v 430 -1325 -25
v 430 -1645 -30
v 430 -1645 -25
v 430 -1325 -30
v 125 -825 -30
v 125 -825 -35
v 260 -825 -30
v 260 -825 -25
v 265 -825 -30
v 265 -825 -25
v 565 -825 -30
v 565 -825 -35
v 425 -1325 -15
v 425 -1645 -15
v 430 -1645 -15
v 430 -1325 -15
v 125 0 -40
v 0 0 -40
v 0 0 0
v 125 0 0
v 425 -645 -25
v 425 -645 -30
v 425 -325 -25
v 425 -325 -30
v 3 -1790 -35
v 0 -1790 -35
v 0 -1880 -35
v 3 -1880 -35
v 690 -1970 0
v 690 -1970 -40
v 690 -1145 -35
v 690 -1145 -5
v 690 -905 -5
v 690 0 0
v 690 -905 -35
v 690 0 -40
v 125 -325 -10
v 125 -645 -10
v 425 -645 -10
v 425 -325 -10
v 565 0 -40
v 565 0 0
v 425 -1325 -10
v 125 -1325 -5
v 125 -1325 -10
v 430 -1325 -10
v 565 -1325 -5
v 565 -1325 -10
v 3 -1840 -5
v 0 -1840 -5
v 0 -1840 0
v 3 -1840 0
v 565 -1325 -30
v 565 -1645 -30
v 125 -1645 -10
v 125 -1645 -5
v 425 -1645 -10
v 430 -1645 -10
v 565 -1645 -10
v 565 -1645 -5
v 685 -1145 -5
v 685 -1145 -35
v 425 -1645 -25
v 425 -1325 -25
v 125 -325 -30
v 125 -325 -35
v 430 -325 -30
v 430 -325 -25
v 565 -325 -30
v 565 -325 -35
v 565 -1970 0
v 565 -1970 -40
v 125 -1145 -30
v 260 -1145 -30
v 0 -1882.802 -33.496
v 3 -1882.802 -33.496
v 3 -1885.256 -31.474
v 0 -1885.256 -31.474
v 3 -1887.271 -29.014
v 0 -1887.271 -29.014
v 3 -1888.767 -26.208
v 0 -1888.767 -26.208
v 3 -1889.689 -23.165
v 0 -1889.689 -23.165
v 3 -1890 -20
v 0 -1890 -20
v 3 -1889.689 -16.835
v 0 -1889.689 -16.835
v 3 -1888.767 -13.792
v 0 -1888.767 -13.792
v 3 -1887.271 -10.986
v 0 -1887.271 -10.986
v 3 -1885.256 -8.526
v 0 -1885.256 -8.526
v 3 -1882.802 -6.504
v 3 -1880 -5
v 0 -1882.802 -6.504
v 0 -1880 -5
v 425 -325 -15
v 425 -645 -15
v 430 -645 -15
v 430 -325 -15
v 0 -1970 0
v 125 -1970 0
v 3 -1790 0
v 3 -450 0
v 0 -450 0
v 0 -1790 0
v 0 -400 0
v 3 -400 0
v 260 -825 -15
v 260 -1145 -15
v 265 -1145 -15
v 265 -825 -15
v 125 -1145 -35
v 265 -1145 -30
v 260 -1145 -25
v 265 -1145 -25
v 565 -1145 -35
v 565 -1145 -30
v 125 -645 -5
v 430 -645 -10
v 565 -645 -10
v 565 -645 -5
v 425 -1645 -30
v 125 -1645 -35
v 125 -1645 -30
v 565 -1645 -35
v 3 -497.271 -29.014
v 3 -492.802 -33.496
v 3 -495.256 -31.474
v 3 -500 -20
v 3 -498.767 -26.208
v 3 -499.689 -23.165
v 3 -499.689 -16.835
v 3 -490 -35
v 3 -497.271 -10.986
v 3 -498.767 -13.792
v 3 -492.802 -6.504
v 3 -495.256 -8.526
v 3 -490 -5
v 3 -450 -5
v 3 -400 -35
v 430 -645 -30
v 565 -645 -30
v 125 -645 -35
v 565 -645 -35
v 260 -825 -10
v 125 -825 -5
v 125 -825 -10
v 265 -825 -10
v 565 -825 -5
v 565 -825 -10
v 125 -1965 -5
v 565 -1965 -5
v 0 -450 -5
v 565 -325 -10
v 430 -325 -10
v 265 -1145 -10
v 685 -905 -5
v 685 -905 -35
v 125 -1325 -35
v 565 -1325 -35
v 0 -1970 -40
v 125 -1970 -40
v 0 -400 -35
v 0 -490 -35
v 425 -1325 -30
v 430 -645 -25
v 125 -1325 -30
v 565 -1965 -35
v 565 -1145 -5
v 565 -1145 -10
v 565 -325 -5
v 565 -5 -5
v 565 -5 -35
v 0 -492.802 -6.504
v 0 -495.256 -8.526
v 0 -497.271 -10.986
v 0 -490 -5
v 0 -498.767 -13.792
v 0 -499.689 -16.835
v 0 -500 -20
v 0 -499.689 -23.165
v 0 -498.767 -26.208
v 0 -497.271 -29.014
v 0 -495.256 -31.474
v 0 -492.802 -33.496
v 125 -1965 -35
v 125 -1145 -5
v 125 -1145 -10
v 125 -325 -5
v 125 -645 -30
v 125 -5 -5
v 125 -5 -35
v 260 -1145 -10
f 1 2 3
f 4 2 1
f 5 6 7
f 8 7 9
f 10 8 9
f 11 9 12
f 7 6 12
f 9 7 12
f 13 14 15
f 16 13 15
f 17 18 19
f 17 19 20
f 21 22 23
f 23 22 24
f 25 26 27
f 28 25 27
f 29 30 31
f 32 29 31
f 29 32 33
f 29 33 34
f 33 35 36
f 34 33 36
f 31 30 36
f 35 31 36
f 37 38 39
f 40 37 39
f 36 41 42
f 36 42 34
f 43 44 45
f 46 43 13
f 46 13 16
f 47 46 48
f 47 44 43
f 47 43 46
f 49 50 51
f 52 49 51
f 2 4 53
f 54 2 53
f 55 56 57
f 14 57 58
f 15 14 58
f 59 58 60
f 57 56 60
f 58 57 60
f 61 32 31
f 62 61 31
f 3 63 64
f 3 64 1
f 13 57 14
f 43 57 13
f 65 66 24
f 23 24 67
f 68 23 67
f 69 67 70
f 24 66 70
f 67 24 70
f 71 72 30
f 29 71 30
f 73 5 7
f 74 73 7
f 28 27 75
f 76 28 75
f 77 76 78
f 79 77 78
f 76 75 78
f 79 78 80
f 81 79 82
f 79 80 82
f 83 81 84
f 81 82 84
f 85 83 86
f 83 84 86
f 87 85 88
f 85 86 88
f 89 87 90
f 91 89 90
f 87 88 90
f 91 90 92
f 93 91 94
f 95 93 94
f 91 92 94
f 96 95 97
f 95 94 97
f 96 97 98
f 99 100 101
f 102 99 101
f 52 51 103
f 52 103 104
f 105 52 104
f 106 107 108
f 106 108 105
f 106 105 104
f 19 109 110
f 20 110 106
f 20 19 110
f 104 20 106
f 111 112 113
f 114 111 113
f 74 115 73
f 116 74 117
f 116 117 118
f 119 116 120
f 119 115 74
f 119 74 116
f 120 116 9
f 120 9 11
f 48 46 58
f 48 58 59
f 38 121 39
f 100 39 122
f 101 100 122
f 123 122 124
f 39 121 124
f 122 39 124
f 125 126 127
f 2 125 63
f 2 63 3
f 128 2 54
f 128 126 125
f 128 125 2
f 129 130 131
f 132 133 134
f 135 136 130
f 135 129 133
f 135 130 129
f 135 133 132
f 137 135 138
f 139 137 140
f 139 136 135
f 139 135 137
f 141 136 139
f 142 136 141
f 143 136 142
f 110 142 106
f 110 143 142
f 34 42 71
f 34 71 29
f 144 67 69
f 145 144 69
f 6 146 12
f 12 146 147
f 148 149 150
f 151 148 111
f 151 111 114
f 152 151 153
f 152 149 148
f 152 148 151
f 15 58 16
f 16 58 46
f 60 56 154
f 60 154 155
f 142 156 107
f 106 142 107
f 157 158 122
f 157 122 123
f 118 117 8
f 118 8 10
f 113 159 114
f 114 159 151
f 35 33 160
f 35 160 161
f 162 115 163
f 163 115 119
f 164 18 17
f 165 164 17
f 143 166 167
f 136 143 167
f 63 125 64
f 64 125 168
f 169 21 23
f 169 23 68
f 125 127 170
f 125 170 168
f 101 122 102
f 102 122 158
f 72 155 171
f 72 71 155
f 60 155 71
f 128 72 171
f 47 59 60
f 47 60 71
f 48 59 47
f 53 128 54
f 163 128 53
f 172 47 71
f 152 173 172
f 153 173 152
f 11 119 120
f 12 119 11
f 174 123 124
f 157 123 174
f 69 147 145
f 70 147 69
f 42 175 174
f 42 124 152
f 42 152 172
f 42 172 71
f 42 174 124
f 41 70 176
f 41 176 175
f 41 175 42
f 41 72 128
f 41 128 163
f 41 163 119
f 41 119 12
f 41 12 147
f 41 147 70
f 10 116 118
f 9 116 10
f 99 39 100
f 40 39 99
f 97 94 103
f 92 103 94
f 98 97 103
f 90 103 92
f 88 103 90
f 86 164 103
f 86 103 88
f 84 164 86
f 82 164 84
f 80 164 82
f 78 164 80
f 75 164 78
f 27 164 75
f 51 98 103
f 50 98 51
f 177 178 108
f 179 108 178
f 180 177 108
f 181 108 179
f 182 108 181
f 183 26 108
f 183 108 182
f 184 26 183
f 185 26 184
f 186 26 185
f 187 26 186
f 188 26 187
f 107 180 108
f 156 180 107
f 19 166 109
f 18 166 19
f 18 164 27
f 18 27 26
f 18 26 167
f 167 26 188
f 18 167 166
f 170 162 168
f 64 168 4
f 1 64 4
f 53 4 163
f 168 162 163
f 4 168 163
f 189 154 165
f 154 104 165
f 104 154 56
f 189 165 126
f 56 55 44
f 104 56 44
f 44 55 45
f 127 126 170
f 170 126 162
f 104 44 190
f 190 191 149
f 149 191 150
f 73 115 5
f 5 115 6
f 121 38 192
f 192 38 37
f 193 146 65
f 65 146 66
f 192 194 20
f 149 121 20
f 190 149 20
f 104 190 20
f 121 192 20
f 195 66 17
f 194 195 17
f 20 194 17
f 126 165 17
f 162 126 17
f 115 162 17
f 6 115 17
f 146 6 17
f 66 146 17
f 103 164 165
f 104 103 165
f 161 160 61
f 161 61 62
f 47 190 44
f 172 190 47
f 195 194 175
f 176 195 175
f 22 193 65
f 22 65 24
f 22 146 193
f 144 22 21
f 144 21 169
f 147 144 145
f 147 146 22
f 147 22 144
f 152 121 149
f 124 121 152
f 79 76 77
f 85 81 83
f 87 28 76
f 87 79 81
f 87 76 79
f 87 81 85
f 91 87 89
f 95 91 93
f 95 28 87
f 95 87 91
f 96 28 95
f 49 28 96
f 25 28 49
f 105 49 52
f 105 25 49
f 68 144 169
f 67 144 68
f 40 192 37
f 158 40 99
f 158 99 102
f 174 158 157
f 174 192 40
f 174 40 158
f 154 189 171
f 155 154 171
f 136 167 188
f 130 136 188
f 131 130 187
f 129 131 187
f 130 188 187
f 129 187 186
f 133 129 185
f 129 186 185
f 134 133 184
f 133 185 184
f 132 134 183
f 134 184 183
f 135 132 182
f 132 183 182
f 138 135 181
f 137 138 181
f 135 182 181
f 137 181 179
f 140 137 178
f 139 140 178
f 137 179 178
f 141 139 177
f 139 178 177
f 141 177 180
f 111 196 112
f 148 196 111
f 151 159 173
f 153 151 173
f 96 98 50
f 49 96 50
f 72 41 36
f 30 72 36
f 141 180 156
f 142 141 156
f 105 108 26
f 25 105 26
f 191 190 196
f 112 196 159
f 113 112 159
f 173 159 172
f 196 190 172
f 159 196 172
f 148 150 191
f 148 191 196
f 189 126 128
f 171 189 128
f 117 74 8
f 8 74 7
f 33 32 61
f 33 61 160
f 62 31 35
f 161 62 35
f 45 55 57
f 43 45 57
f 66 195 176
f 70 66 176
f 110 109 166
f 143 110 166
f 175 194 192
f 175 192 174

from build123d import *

# Parameters (mm, degrees)
SKETCH3_W           = 690
SKETCH3_H           = 1970
BOSS_EXTRUDE2_DEPTH = 20
SKETCH4_W           = 440
SKETCH4_H           = 1970
CUT_EXTRUDE1_DEPTH  = 5
SKETCH5_W           = 440
SKETCH5_H           = 5
CUT_EXTRUDE2_DEPTH  = 16
SKETCH6_W           = 440
SKETCH6_H           = 320
CUT_EXTRUDE8_DEPTH  = 10
SKETCH7_W           = 5
SKETCH7_H           = 320
CUT_EXTRUDE9_DEPTH  = 5
SKETCH8_W           = 30
SKETCH8_H           = 240
CUT_EXTRUDE10_DEPTH = 5
CUT_EXTRUDE11_DEPTH = 3


with BuildPart() as part:
    # Sketch3 → Boss-Extrude2 (new body)
    with BuildSketch(Plane.XY):
        with Locations((345, -985)):
            Rectangle(SKETCH3_W, SKETCH3_H)
    boss_extrude2 = extrude(amount=-BOSS_EXTRUDE2_DEPTH)

    # Sketch4 → Cut-Extrude1 (cut)
    with BuildSketch(Plane.XY):
        with Locations((345, -985)):
            Rectangle(SKETCH4_W, SKETCH4_H)
    cut_extrude1 = extrude(amount=-CUT_EXTRUDE1_DEPTH, mode=Mode.SUBTRACT)

    # Sketch5 → Cut-Extrude2 (cut, through all)
    with BuildSketch(Plane.XY.offset(-5)):
        with Locations((345, -2.5)):
            Rectangle(SKETCH5_W, SKETCH5_H)
        with Locations((345, -1967.5)):
            Rectangle(SKETCH5_W, SKETCH5_H)
    cut_extrude2 = extrude(amount=-CUT_EXTRUDE2_DEPTH, mode=Mode.SUBTRACT)

    # Sketch6 → Cut-Extrude8 (cut)
    with BuildSketch(Plane.XY):
        with Locations((345, -485)):
            Rectangle(SKETCH6_W, SKETCH6_H)
        with Locations((345, -985)):
            Rectangle(SKETCH6_W, SKETCH6_H)
        with Locations((345, -1485)):
            Rectangle(SKETCH6_W, SKETCH6_H)
    cut_extrude8 = extrude(amount=-CUT_EXTRUDE8_DEPTH, mode=Mode.SUBTRACT)

    # Sketch7 → Cut-Extrude9 (cut)
    with BuildSketch(Plane.XY.offset(-10)):
        with Locations((427.5, -485)):
            Rectangle(SKETCH7_W, SKETCH7_H)
        with Locations((262.5, -985)):
            Rectangle(SKETCH7_W, SKETCH7_H)
        with Locations((427.5, -1485)):
            Rectangle(SKETCH7_W, SKETCH7_H)
    cut_extrude9 = extrude(amount=-CUT_EXTRUDE9_DEPTH, mode=Mode.SUBTRACT)

    # Mirror1: Boss-Extrude2, Cut-Extrude1, Cut-Extrude2, Cut-Extrude8, Cut-Extrude9 across plane
    add(boss_extrude2.mirror(Plane.XY.offset(-20)))
    add(cut_extrude1.mirror(Plane.XY.offset(-20)), mode=Mode.SUBTRACT)
    add(cut_extrude2.mirror(Plane.XY.offset(-20)), mode=Mode.SUBTRACT)
    add(cut_extrude8.mirror(Plane.XY.offset(-20)), mode=Mode.SUBTRACT)
    add(cut_extrude9.mirror(Plane.XY.offset(-20)), mode=Mode.SUBTRACT)

    # Sketch8 → Cut-Extrude10 (cut)
    with BuildSketch(Plane(origin=(690, 0, 0), x_dir=(0, 0, -1), z_dir=(1, 0, 0))):
        with Locations((20, -1025)):
            Rectangle(SKETCH8_W, SKETCH8_H)
    extrude(amount=-CUT_EXTRUDE10_DEPTH, mode=Mode.SUBTRACT)

    # Sketch9 → Cut-Extrude11 (cut)
    with BuildSketch(Plane.ZY):
        with BuildLine():
            Line((-35, -400), (-35, -490))
            ThreePointArc((-35, -490), (-20, -500), (-5, -490))
            Line((-5, -490), (-5, -450))
            Line((-5, -450), (0, -450))
            Line((0, -450), (0, -400))
            Line((0, -400), (-35, -400))
        make_face()
        with BuildLine():
            Line((-35, -1790), (-35, -1880))
            ThreePointArc((-35, -1880), (-20, -1890), (-5, -1880))
            Line((-5, -1880), (-5, -1840))
            Line((-5, -1840), (0, -1840))
            Line((0, -1840), (0, -1790))
            Line((0, -1790), (-35, -1790))
        make_face()
    extrude(amount=-CUT_EXTRUDE11_DEPTH, mode=Mode.SUBTRACT)


solid = part.part
